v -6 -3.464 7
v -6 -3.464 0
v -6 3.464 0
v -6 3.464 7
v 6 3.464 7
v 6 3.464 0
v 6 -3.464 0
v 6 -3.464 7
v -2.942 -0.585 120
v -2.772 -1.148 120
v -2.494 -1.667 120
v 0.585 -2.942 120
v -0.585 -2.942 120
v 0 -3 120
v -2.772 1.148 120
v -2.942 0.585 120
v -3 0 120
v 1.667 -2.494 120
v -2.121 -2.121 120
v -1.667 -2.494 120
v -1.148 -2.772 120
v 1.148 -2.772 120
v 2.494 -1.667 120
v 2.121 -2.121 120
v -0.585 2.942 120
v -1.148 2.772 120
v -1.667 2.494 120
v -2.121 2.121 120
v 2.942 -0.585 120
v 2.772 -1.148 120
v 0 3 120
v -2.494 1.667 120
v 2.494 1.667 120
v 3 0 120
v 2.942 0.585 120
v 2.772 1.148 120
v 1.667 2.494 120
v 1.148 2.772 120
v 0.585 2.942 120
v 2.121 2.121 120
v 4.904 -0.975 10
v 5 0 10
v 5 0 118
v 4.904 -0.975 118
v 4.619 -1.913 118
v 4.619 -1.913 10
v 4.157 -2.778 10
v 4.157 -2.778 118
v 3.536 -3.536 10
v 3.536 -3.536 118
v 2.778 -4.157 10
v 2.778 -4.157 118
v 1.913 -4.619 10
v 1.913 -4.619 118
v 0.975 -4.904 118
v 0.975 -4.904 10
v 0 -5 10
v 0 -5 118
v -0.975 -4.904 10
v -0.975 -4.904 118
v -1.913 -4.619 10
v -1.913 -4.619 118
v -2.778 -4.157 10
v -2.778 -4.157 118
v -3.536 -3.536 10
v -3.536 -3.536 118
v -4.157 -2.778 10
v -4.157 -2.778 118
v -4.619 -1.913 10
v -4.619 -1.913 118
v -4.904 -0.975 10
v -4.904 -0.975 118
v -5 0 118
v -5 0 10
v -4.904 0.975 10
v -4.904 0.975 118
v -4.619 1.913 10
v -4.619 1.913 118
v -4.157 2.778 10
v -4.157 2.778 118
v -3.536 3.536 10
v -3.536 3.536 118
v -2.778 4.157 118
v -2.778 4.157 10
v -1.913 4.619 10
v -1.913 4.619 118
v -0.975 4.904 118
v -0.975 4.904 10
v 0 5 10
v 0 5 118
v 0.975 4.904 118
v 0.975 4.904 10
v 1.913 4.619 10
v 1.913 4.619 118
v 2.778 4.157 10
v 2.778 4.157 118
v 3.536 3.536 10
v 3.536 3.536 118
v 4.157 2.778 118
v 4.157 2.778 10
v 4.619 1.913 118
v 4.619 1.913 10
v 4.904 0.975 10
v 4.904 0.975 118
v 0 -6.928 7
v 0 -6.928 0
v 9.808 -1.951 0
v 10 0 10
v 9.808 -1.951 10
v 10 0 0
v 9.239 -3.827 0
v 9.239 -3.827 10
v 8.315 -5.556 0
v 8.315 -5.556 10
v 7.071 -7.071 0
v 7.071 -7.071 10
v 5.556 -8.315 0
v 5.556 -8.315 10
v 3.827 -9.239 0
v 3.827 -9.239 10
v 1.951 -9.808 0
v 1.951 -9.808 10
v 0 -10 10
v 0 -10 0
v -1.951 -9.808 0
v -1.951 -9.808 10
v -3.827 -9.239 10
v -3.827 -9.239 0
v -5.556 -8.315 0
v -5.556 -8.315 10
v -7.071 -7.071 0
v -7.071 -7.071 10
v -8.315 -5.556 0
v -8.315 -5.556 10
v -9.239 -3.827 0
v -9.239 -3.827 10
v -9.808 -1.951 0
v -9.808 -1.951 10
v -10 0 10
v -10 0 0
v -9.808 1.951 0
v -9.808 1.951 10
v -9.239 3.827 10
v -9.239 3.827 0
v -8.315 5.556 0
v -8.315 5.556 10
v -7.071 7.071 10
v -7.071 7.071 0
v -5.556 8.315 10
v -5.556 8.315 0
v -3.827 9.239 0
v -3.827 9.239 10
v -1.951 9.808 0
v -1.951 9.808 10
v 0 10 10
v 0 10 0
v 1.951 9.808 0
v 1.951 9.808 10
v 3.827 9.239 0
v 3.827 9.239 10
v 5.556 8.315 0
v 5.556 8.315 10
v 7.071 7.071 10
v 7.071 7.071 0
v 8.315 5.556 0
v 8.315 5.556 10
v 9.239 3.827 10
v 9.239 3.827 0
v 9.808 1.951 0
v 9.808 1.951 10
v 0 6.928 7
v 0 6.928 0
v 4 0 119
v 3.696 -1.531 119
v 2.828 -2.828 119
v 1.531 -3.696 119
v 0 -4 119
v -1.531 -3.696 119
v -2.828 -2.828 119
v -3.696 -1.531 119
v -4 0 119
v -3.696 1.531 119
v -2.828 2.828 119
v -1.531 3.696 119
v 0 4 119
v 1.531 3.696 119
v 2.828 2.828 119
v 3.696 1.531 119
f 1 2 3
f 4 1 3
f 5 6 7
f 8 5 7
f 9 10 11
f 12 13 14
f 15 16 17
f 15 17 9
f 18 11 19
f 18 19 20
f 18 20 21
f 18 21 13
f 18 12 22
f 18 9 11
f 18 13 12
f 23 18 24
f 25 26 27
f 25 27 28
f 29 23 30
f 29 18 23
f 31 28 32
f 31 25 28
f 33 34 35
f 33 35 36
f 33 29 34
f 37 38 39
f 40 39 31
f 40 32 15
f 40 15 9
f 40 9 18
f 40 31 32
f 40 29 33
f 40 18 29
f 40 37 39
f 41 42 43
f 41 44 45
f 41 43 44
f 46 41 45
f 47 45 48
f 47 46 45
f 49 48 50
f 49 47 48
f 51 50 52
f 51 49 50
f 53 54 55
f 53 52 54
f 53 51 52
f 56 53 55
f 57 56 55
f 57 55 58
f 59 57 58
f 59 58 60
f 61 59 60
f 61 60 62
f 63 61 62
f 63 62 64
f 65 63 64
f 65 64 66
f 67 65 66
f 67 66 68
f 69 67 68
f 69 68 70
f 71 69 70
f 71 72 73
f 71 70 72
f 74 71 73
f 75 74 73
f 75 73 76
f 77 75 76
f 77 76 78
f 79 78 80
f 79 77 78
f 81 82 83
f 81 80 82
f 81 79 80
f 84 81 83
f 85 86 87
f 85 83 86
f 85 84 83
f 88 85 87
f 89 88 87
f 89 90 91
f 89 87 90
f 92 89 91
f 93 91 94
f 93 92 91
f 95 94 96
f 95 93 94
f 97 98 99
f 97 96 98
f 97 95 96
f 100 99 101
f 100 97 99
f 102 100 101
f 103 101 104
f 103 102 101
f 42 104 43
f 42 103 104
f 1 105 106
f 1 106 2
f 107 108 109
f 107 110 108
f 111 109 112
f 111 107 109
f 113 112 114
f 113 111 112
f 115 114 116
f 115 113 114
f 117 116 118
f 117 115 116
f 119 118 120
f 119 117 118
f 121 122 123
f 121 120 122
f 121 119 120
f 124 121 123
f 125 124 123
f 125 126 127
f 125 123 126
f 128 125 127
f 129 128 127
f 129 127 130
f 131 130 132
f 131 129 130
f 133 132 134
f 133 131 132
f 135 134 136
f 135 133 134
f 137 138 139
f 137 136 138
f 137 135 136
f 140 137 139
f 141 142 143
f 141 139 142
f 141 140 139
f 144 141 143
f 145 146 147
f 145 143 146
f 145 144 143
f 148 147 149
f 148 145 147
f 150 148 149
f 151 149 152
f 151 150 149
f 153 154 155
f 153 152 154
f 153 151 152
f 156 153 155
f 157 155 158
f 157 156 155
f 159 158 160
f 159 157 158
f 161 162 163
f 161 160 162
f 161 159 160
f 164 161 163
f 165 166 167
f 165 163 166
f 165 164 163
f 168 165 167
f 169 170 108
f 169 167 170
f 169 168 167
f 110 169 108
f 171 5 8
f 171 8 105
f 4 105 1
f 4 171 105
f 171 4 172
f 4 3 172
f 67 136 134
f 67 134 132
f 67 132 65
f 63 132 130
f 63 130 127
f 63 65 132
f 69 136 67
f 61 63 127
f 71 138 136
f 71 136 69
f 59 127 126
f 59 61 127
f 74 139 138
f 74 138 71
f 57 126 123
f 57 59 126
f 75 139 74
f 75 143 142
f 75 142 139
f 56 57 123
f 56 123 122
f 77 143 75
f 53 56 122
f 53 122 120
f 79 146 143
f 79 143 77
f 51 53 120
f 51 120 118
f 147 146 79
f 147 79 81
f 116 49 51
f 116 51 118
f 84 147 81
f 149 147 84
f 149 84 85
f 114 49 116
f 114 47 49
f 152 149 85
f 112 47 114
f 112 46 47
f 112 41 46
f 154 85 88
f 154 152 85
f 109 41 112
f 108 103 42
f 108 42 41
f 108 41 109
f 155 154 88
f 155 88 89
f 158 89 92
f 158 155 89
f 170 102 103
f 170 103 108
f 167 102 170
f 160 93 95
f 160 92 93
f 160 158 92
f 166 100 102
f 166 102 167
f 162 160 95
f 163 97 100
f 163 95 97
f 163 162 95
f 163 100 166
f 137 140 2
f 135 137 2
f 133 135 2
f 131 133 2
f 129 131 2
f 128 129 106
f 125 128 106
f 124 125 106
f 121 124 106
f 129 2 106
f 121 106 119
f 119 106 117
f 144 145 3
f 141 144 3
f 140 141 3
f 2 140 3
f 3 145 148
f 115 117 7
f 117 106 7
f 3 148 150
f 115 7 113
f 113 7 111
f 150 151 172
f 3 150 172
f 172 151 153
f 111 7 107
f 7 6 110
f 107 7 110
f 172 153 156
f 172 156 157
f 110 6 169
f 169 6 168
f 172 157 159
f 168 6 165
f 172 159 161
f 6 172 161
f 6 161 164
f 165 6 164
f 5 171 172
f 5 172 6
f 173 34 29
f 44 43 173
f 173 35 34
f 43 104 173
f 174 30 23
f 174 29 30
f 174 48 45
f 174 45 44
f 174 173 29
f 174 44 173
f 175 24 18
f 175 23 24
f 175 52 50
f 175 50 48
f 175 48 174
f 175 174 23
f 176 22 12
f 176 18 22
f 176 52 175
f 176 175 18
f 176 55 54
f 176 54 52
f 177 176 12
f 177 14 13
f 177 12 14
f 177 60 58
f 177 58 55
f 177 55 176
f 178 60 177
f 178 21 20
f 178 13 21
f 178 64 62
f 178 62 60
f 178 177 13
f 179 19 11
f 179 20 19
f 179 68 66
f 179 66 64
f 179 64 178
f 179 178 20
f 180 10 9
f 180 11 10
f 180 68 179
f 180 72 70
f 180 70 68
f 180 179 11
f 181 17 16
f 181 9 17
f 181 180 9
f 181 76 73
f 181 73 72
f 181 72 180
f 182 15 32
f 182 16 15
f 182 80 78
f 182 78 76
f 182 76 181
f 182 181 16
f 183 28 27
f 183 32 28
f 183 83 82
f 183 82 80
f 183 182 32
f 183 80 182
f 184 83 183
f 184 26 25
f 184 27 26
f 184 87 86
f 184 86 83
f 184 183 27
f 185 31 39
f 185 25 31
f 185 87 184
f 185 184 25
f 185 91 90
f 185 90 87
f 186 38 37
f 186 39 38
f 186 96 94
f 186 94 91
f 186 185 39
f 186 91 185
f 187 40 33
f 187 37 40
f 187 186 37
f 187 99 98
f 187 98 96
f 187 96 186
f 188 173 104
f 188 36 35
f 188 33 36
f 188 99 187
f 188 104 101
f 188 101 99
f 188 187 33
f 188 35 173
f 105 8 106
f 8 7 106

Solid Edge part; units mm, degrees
sketch "Sketch1" plane through (0, 0, 0) normal (0, 0, 1) x (1, 0, 0)
  circle A0 centre (0, 0) radius 10
  dimension "D1" = 20
extrude "Protrusion1" add sketch "Sketch1" along normal blind 10
sketch "Sketch2" plane through (0, 0, 10) normal (0, 0, 1) x (1, 0, 0)
  circle A0 centre (0, 0) radius 5
  dimension "D1" = 20
  dimension "D2" = 10
extrude "ExtrudedProtrusion_2" add sketch "Sketch2" along normal blind 110
cosmetic_thread "Thread_2" size "M10" thread depth 15
chamfer "Chamfer_1" distance 2 angle 45 1 edges at (-5, 0, 120)
sketch "Sketch3" plane through (0, 0, 0) normal (0, 0, -1) x (0, 1, 0)
  line L0 (-3.4641, 6) -> (-6.9282, 0)
  line L1 (-6.9282, 0) -> (-3.4641, -6)
  line L2 (-3.4641, -6) -> (3.4641, -6)
  line L3 (3.4641, -6) -> (6.9282, 0)
  line L4 (6.9282, 0) -> (3.4641, 6)
  line L5 (3.4641, 6) -> (-3.4641, 6)
extrude "ExtrudedCutout_1" cut sketch "Sketch3" against normal blind 7
properties part number "1002"
